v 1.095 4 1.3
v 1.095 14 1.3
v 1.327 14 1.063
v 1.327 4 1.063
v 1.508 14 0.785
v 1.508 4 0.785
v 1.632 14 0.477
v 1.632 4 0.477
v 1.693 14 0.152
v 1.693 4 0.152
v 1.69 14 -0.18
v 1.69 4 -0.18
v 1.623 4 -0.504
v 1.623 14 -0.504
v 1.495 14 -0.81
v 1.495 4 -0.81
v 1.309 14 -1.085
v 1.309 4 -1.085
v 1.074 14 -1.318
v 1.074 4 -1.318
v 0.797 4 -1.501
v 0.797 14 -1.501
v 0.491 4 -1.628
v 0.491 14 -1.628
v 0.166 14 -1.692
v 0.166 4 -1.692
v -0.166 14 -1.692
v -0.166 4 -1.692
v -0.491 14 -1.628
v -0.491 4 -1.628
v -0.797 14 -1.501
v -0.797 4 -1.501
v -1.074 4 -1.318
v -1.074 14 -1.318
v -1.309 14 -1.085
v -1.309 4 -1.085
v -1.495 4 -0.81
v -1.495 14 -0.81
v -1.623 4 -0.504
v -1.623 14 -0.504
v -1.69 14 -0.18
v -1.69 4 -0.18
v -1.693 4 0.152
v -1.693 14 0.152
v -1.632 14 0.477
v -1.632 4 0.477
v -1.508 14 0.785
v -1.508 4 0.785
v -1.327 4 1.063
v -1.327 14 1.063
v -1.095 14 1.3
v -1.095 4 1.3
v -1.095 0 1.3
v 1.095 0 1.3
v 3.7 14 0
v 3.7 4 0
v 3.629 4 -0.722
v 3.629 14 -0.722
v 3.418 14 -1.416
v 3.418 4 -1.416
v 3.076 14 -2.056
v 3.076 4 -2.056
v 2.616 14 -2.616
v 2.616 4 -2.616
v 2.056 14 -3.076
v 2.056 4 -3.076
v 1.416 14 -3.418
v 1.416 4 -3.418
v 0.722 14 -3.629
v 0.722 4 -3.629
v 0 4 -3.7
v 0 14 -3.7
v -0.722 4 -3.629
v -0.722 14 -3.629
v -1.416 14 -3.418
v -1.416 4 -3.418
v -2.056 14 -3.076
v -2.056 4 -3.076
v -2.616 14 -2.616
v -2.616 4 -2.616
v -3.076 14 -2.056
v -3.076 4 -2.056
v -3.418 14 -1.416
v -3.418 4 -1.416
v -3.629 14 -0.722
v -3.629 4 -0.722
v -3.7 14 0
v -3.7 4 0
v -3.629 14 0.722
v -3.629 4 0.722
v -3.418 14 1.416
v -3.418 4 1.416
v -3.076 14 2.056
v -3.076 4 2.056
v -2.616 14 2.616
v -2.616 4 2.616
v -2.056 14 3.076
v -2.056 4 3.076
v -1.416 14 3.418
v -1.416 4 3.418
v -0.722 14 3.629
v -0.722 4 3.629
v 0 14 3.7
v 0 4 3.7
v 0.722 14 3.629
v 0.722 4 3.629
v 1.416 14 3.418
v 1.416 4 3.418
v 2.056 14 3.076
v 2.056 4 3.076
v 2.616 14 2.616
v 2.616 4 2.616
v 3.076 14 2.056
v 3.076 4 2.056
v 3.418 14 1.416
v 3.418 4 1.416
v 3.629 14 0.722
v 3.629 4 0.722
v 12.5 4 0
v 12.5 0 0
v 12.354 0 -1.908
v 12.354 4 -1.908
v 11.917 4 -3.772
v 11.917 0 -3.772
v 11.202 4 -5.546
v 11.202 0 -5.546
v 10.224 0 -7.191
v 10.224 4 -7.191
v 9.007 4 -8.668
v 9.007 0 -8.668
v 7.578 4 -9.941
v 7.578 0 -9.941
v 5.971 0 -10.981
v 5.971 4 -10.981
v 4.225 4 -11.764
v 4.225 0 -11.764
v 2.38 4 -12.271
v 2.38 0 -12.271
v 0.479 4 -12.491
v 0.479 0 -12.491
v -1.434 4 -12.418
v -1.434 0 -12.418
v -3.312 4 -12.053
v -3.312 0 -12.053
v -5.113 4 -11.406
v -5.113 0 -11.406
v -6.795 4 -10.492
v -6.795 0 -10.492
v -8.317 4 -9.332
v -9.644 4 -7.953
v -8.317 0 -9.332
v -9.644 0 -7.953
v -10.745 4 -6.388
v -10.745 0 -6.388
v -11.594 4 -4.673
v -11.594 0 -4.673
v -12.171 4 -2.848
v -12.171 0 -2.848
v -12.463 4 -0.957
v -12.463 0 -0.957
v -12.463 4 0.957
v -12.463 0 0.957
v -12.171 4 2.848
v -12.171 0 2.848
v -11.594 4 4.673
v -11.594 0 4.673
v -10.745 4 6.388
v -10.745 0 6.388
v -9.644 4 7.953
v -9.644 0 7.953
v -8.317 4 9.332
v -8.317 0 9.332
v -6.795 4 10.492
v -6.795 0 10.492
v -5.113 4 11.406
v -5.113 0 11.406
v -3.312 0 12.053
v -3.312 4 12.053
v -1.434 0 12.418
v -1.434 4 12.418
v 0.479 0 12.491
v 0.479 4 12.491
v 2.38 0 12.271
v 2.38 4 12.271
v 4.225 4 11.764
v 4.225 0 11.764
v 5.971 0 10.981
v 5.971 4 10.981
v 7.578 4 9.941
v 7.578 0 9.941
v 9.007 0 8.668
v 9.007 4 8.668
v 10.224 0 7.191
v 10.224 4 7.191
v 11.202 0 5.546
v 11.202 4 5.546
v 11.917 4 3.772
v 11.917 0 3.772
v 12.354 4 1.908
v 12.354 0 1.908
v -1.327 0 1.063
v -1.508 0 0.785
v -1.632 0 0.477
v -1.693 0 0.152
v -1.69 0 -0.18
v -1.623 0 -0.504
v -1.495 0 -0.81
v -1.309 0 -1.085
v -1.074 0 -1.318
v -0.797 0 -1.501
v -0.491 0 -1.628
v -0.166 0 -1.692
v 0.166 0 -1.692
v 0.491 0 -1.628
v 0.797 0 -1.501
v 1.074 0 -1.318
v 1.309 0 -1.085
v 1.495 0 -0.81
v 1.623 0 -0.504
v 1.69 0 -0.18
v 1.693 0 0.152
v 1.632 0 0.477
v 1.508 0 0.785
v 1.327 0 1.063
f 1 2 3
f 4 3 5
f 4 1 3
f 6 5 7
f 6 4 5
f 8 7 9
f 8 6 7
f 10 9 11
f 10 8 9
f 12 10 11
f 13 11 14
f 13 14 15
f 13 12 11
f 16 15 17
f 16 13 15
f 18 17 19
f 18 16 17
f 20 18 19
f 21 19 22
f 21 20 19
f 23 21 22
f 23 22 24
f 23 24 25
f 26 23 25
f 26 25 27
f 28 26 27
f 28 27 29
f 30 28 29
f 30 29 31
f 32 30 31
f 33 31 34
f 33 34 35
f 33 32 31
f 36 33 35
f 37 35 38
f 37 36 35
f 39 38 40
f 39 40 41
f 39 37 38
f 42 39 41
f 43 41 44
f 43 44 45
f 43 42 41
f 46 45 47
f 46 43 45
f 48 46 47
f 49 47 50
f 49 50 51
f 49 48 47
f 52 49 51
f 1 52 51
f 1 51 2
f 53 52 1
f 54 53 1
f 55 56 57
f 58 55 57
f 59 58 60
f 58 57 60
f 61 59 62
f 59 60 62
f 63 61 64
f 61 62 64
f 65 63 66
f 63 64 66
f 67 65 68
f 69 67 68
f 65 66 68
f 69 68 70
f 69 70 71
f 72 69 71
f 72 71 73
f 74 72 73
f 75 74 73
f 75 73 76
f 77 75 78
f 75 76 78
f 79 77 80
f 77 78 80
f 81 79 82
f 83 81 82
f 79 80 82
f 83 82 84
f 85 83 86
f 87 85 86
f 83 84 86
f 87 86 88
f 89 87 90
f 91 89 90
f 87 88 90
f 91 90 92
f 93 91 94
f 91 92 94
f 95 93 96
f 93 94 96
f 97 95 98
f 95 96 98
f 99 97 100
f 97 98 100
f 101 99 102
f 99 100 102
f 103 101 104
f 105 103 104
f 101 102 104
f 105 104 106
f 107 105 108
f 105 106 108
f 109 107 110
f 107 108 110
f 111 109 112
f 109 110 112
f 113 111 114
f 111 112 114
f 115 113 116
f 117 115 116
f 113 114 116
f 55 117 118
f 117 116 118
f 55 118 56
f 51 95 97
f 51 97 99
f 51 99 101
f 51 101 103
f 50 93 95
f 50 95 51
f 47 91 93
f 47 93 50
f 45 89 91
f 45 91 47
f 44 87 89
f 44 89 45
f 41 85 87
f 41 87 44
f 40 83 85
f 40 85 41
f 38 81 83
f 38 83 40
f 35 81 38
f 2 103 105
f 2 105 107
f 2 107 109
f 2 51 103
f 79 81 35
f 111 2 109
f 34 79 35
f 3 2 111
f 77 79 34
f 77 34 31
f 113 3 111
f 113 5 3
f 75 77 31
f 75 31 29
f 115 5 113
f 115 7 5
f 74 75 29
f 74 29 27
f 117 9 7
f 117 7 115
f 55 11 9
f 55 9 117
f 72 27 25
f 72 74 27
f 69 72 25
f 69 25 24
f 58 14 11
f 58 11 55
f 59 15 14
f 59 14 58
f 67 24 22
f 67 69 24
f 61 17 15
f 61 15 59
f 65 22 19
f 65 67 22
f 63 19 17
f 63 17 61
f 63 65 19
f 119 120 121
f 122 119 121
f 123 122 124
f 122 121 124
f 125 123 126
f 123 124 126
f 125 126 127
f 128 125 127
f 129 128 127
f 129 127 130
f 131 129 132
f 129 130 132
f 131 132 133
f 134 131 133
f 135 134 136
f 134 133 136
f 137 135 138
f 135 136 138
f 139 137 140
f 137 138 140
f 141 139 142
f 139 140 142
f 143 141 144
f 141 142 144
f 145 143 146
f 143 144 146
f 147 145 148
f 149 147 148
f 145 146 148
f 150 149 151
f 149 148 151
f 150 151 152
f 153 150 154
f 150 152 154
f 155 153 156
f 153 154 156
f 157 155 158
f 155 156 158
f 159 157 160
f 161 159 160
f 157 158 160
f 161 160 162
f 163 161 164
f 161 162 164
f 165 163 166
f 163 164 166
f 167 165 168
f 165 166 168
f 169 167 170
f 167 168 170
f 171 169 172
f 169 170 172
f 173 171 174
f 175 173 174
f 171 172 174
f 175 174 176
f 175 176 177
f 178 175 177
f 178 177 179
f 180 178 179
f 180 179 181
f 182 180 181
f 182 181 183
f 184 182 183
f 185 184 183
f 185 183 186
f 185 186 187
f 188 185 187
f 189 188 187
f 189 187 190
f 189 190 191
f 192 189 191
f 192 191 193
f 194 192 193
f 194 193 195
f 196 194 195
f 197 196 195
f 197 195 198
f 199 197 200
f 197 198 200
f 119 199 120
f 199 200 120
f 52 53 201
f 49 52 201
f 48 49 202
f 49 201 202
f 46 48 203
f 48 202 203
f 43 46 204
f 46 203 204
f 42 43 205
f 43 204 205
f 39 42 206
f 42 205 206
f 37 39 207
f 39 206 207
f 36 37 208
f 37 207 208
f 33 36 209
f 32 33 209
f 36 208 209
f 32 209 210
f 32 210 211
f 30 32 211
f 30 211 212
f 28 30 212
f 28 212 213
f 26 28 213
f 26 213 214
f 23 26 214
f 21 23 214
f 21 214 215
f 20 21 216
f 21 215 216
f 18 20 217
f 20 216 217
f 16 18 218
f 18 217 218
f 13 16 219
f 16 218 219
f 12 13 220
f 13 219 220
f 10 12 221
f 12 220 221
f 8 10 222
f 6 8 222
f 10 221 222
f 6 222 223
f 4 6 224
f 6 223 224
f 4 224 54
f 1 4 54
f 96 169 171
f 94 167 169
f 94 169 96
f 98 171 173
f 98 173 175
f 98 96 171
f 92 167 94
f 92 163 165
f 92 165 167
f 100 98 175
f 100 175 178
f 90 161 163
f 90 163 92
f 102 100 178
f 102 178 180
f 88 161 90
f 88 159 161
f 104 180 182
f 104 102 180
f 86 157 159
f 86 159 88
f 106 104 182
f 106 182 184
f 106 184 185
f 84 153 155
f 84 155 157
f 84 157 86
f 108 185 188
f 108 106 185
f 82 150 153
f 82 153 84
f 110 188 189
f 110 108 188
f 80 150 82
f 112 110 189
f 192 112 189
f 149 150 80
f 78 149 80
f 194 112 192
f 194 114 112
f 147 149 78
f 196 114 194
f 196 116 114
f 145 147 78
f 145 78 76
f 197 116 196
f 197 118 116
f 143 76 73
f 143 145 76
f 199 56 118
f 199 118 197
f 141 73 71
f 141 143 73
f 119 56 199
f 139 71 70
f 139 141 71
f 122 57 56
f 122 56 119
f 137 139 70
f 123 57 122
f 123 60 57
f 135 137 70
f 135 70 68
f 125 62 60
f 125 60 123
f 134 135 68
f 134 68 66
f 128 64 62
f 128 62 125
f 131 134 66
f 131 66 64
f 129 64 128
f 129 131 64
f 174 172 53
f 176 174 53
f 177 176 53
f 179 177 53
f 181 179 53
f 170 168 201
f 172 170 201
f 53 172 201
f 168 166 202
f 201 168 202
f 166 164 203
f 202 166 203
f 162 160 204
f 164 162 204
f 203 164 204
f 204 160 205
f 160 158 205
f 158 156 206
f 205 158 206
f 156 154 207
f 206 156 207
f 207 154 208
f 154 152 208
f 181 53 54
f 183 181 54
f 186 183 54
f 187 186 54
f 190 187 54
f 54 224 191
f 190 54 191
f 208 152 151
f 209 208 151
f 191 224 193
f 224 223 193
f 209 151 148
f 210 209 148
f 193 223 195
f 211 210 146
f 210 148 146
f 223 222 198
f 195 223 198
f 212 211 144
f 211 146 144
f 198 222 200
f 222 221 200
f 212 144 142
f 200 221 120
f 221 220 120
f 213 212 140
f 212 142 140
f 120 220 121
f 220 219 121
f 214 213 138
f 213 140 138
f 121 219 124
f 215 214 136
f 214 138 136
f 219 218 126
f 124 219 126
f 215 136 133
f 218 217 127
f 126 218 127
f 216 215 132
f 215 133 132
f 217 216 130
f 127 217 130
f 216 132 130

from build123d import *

# Parameters (mm, degrees)
SKETCH1_R           = 12.5
BOSS_EXTRUDE1_DEPTH = 4
SKETCH2_R           = 3.7
BOSS_EXTRUDE2_DEPTH = 10


with BuildPart() as part:
    # Sketch1 → Boss-Extrude1 (new body)
    with BuildSketch(Plane(origin=(0, 0, 0), x_dir=(1, 0, 0), z_dir=(0, 1, 0))):
        Circle(SKETCH1_R)
        with BuildLine():
            Line((1.095445115, -1.3), (-1.095445115, -1.3))
            ThreePointArc((-1.095445115, -1.3), (0, 1.7), (1.095445115, -1.3))
        make_face(mode=Mode.SUBTRACT)
    extrude(amount=BOSS_EXTRUDE1_DEPTH)

    # Sketch2 → Boss-Extrude2 (add)
    with BuildSketch(Plane(origin=(0, 4, 0), x_dir=(1, 0, 0), z_dir=(0, 1, 0))):
        Circle(SKETCH2_R)
        with BuildLine():
            Line((-1.095445115, -1.3), (1.095445115, -1.3))
            ThreePointArc((1.095445115, -1.3), (0, 1.7), (-1.095445115, -1.3))
        make_face(mode=Mode.SUBTRACT)
    extrude(amount=BOSS_EXTRUDE2_DEPTH)


solid = part.part
